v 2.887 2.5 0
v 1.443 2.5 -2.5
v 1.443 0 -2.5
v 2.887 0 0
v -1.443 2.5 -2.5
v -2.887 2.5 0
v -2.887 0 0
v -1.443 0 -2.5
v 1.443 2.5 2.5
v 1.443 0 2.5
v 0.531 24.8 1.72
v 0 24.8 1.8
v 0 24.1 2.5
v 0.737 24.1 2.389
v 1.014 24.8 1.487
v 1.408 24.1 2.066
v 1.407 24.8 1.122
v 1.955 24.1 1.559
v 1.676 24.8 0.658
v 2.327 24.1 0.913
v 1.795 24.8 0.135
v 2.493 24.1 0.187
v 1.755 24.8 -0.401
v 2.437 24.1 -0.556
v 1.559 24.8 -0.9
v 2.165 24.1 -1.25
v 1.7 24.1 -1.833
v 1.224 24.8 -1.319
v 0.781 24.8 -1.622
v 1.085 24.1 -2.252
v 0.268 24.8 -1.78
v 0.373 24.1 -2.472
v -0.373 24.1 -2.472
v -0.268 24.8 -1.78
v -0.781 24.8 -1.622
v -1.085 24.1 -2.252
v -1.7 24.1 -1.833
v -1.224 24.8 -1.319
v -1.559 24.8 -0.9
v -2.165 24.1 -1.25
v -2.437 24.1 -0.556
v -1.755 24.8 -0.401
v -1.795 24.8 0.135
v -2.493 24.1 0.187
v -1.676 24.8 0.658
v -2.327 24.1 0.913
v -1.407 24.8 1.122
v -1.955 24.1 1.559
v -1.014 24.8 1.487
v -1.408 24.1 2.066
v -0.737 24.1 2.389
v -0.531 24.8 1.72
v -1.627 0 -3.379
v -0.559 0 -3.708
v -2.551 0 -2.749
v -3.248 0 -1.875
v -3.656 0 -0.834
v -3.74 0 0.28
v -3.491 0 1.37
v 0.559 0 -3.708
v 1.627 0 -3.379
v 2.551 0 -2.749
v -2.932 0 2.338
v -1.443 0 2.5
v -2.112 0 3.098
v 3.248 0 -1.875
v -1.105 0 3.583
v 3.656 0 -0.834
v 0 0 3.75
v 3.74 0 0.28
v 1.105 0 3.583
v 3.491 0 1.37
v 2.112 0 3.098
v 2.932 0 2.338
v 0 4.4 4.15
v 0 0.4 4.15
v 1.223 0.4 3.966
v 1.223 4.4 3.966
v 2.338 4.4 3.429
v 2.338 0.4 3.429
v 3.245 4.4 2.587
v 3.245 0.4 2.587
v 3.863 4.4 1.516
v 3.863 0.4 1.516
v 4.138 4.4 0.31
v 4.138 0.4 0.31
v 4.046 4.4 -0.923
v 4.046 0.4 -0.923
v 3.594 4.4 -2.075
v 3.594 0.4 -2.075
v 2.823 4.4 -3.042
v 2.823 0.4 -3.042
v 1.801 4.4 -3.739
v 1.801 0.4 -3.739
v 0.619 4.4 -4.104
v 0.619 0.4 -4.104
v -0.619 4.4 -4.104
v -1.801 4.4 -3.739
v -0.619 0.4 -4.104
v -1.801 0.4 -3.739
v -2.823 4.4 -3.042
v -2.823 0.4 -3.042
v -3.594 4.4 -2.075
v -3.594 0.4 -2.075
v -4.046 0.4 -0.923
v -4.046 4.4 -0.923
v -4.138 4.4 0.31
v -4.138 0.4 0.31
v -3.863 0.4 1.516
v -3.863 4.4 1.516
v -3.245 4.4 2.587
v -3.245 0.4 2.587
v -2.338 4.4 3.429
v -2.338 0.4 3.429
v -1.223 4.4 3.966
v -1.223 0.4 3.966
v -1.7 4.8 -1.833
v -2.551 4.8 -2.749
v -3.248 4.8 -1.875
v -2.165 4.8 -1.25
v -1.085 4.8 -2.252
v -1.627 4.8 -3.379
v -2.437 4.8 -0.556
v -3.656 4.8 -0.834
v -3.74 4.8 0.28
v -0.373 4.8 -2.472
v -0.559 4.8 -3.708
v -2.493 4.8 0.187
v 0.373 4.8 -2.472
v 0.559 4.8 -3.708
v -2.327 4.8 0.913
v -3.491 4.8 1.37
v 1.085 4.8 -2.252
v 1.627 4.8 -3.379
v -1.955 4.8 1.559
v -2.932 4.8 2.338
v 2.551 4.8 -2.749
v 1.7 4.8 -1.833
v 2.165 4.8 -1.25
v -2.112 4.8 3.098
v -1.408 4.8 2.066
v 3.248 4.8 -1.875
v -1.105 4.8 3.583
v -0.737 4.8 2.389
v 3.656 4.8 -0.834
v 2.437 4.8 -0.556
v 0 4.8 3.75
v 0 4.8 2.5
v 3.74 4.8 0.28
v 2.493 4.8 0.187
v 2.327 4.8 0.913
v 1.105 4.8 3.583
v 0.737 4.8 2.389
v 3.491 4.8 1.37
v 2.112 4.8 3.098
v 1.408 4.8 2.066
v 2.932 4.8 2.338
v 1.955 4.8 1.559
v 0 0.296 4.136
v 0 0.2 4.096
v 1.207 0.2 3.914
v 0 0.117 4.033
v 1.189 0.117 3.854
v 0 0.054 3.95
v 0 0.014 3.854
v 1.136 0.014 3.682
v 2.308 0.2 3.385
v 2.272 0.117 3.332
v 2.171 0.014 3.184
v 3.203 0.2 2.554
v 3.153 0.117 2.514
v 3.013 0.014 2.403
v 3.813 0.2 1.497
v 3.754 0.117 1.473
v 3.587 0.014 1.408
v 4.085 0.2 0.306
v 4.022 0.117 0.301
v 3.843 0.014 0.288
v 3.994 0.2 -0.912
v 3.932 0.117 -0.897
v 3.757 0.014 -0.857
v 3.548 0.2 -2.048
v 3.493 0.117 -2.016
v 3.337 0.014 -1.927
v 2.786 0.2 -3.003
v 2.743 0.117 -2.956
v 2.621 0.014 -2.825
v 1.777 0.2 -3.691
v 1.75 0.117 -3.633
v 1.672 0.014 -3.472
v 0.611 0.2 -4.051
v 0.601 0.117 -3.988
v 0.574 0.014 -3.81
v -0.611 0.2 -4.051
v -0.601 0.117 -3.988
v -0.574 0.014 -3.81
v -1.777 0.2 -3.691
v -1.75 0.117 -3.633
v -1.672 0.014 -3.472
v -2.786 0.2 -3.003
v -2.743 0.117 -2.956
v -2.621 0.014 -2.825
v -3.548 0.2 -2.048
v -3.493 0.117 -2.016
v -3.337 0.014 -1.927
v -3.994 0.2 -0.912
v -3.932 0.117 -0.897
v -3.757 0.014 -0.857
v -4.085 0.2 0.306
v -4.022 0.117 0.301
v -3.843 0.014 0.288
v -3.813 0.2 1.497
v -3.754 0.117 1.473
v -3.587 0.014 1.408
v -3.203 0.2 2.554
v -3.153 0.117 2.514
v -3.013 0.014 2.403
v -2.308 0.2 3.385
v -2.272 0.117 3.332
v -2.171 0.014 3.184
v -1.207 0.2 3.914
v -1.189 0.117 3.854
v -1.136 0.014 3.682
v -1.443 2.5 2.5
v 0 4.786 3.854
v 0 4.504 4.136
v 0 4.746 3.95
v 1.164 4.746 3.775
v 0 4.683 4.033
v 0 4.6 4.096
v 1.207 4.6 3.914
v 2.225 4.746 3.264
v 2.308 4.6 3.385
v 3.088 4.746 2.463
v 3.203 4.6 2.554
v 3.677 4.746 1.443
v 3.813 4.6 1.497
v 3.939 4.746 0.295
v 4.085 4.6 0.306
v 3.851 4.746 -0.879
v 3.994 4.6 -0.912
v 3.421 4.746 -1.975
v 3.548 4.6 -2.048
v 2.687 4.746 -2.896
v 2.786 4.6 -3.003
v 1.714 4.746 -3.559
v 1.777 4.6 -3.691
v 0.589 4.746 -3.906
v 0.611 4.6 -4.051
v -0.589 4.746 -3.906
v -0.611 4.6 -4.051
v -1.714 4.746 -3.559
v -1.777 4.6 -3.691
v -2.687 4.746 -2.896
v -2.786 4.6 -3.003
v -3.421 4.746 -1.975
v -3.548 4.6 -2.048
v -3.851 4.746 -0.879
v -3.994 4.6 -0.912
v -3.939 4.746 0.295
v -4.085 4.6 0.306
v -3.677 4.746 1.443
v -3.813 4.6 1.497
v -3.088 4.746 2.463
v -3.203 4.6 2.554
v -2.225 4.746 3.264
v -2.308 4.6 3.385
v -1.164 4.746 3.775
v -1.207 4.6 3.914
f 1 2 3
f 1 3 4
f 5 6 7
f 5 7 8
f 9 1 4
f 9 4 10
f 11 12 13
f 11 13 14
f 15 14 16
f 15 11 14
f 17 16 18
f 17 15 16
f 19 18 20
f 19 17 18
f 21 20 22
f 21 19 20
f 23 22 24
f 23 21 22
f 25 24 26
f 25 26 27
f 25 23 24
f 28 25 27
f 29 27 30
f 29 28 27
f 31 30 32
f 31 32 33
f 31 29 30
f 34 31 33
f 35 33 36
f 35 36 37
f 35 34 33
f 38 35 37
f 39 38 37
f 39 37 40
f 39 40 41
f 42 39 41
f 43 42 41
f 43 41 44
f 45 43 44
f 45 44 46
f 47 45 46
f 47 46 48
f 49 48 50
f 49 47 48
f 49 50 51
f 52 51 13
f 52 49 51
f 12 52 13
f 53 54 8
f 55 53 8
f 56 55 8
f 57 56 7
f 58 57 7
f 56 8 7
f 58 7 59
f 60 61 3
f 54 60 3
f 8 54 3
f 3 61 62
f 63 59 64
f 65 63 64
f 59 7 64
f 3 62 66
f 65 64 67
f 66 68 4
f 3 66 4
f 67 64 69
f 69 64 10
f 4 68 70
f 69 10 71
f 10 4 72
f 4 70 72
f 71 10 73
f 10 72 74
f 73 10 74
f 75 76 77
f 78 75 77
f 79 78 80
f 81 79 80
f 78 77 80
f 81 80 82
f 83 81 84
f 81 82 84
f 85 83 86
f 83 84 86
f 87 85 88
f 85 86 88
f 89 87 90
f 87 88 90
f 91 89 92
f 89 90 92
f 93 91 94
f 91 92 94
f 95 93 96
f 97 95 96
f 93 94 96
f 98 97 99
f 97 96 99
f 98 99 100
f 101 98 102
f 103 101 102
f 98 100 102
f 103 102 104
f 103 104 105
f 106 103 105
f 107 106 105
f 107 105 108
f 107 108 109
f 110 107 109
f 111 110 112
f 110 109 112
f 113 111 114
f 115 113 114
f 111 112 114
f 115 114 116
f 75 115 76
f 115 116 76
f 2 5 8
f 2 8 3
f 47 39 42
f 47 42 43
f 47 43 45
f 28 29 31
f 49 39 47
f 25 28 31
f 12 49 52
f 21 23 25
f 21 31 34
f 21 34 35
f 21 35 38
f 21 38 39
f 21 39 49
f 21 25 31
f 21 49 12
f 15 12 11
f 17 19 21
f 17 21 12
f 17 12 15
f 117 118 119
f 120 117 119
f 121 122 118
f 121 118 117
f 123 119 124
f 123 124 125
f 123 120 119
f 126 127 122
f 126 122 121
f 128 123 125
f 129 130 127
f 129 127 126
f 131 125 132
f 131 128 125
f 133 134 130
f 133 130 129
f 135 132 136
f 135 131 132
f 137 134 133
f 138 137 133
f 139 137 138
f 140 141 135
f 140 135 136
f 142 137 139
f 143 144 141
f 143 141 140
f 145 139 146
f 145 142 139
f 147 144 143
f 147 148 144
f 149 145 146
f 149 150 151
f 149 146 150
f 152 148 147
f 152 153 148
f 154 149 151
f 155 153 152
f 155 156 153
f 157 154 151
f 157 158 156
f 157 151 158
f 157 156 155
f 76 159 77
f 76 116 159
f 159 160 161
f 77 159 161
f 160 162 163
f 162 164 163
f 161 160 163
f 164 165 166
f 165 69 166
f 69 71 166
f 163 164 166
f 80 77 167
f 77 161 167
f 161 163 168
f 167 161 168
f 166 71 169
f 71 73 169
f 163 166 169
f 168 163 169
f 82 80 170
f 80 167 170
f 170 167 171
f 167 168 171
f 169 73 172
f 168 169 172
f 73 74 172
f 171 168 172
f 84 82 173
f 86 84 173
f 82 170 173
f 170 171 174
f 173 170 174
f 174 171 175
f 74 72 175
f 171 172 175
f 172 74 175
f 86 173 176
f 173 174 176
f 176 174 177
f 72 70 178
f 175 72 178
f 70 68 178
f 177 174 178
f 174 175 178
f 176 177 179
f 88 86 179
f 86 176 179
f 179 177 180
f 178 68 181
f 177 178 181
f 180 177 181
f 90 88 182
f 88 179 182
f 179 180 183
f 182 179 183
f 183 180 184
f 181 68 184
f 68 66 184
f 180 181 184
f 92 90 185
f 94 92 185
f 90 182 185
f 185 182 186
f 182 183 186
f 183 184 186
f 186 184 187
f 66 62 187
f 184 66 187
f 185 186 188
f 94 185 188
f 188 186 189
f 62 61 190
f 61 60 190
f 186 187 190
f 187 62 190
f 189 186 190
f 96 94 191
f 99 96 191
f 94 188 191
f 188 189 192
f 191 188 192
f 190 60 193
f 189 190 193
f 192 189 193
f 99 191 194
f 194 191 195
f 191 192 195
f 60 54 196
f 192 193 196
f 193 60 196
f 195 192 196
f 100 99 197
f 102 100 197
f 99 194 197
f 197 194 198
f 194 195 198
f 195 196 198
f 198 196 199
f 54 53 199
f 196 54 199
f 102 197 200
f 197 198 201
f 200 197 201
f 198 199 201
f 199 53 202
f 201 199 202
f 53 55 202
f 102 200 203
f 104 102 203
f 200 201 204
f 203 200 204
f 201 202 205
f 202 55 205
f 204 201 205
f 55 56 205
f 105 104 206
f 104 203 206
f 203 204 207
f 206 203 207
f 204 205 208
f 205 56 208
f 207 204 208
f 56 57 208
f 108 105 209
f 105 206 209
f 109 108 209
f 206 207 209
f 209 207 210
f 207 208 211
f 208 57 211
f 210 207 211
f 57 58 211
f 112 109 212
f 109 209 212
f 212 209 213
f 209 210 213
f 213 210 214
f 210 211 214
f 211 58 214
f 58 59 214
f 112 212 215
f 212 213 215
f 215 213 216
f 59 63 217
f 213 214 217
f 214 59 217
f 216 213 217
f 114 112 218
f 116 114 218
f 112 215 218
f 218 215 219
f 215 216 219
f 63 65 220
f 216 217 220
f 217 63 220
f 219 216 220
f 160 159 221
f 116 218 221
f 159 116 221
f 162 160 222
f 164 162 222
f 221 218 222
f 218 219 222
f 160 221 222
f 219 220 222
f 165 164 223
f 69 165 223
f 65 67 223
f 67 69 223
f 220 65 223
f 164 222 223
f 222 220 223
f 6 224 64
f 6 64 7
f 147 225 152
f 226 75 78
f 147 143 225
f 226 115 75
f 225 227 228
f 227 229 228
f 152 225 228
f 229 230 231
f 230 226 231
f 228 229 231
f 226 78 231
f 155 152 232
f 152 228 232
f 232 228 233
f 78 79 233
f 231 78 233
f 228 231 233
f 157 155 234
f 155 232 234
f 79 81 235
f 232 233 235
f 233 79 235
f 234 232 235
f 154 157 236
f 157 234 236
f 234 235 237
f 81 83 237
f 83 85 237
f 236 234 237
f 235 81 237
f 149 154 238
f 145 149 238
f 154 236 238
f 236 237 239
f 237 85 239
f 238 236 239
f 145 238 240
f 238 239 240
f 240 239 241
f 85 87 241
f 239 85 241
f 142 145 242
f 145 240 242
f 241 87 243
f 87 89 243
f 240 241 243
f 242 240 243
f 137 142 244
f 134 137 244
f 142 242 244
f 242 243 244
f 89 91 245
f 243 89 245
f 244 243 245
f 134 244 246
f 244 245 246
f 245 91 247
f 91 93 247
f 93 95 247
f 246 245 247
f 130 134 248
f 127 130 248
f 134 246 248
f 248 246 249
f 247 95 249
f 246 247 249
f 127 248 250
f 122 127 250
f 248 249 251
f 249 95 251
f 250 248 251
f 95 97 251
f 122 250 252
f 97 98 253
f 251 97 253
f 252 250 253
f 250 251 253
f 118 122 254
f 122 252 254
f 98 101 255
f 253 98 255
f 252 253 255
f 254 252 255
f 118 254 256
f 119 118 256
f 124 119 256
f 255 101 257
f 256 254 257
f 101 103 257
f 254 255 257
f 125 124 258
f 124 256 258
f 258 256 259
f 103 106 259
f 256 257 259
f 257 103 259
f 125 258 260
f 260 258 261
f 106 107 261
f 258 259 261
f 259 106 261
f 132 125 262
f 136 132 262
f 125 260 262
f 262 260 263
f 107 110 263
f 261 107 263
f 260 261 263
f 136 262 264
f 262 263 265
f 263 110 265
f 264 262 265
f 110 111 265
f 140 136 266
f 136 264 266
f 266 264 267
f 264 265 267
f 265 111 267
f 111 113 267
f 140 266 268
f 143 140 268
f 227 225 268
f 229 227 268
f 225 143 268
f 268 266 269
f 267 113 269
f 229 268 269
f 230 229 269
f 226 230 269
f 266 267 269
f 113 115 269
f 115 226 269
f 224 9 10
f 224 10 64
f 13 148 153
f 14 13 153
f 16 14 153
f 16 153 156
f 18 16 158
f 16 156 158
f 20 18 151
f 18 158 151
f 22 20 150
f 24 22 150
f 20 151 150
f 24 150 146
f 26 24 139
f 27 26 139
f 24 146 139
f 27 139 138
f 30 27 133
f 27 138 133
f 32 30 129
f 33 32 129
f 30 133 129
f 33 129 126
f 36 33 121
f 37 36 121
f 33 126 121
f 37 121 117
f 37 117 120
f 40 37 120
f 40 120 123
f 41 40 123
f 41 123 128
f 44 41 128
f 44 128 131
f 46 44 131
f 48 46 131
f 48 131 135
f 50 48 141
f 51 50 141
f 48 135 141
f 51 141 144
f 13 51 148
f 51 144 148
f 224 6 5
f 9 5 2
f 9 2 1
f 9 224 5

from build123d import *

# Parameters (mm, degrees)
SKETCH1_R               = 4.15
BOSS_EXTRUDE1_DEPTH     = 4.8
SKETCH2_R               = 2.5
BOSS_EXTRUDE2_DEPTH     = 20
CUT_EXTRUDE1_DEPTH      = 26.484995586
CUT_EXTRUDE1_DEPTH_BACK = 2.5
CHAMFER1_SIZE           = 0.7
FILLET1_R               = 0.4


with BuildPart() as part:
    # Sketch1 → Boss-Extrude1 (new body)
    with BuildSketch(Plane(origin=(0, 0, 0), x_dir=(1, 0, 0), z_dir=(0, 1, 0))):
        with Locations(Location((0, 0, 0), (0, 0, 270))):
            Circle(SKETCH1_R)
    extrude(amount=BOSS_EXTRUDE1_DEPTH)

    # Sketch2 → Boss-Extrude2 (add)
    with BuildSketch(Plane(origin=(0, 4.8, 0), x_dir=(1, 0, 0), z_dir=(0, 1, 0))):
        with Locations(Location((0, 0, 0), (0, 0, 270))):
            Circle(SKETCH2_R)
    extrude(amount=BOSS_EXTRUDE2_DEPTH)

    # Sketch3 → Cut-Extrude1 (cut, two sides: drawn at the far end of the back side and taken through both)
    with BuildSketch(Plane.XZ.offset(-CUT_EXTRUDE1_DEPTH_BACK)):
        Polygon((2.886751346, 0), (1.443375673, 2.5), (-1.443375673, 2.5), (-2.886751346, 0), (-1.443375673, -2.5), (1.443375673, -2.5), align=None)
    extrude(amount=CUT_EXTRUDE1_DEPTH + CUT_EXTRUDE1_DEPTH_BACK, mode=Mode.SUBTRACT)

    # Chamfer1
    chamfer1_edges = [part.edges().sort_by_distance(p)[0] for p in [
        (0, 24.8, -2.5),
    ]]
    chamfer(chamfer1_edges, length=CHAMFER1_SIZE)

    # Fillet1
    fillet1_edges = [part.edges().sort_by_distance(p)[0] for p in [
        (0, 0, -4.15),
        (0, 4.8, -4.15),
    ]]
    fillet(fillet1_edges, radius=FILLET1_R)


solid = part.part
